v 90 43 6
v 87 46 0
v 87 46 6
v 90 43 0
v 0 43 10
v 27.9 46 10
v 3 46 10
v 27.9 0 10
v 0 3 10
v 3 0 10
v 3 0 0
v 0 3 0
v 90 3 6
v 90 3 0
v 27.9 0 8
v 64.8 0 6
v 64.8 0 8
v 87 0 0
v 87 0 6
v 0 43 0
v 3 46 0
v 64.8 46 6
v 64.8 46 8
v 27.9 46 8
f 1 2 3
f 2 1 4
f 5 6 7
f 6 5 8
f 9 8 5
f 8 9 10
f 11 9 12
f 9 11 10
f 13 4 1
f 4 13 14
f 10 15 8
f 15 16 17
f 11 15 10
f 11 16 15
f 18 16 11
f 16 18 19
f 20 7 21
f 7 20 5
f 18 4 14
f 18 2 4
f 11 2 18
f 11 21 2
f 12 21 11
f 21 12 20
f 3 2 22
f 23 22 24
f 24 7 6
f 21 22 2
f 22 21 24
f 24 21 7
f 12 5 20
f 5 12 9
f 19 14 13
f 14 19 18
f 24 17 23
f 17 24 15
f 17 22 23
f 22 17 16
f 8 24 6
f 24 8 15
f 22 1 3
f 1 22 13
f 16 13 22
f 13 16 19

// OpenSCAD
$fn = 32;

// ----------------------------------------------------------------------
// Stepped bar: twostep, 90 x 46 x 10/6 mm
// ----------------------------------------------------------------------

// --- parameters (mm) ---
bar_l = 90;               // bar length, X
bar_w = 46;               // bar width, Y
plate_t = 10;             // thickness of the thick zone, Z
thin_t = 6;               // thickness of the thin zone
corner_c = 3;             // corner chamfer of the bar
step_cut = 4;             // material removed from the thin zone
stair1_x = 27.9;          // position of the first stair
stair2_x = 64.8;          // position of the second stair
mid_t = 8;                // thickness of the middle zone
depth_1 = 2;              // depth of cut 1 from the top face
depth_2 = 4;              // depth of cut 2 from the top face
fit_tol = 0.05;           // declared fit tolerance (prompt contract)
free_tol = 0.3;           // declared free tolerance (prompt contract)

profile = [[3, 0], [87, 0], [90, 3], [90, 43], [87, 46], [3, 46], [0, 43], [0, 3]];  // primary outline, 8 points, counter clockwise
void_1 = [[27.9, -1], [64.8, -1], [64.8, 47], [27.9, 47]];  // first stair, 4 points
void_2 = [[64.8, -1], [91, -1], [91, 47], [64.8, 47]];  // second stair, 4 points

// --- the one profile operation ---
difference() {
  linear_extrude(height = plate_t) polygon(points = profile);
  translate([0, 0, plate_t - depth_1])
    linear_extrude(height = depth_1 + 1) polygon(points = void_1);
  translate([0, 0, plate_t - depth_2])
    linear_extrude(height = depth_2 + 1) polygon(points = void_2);
}
